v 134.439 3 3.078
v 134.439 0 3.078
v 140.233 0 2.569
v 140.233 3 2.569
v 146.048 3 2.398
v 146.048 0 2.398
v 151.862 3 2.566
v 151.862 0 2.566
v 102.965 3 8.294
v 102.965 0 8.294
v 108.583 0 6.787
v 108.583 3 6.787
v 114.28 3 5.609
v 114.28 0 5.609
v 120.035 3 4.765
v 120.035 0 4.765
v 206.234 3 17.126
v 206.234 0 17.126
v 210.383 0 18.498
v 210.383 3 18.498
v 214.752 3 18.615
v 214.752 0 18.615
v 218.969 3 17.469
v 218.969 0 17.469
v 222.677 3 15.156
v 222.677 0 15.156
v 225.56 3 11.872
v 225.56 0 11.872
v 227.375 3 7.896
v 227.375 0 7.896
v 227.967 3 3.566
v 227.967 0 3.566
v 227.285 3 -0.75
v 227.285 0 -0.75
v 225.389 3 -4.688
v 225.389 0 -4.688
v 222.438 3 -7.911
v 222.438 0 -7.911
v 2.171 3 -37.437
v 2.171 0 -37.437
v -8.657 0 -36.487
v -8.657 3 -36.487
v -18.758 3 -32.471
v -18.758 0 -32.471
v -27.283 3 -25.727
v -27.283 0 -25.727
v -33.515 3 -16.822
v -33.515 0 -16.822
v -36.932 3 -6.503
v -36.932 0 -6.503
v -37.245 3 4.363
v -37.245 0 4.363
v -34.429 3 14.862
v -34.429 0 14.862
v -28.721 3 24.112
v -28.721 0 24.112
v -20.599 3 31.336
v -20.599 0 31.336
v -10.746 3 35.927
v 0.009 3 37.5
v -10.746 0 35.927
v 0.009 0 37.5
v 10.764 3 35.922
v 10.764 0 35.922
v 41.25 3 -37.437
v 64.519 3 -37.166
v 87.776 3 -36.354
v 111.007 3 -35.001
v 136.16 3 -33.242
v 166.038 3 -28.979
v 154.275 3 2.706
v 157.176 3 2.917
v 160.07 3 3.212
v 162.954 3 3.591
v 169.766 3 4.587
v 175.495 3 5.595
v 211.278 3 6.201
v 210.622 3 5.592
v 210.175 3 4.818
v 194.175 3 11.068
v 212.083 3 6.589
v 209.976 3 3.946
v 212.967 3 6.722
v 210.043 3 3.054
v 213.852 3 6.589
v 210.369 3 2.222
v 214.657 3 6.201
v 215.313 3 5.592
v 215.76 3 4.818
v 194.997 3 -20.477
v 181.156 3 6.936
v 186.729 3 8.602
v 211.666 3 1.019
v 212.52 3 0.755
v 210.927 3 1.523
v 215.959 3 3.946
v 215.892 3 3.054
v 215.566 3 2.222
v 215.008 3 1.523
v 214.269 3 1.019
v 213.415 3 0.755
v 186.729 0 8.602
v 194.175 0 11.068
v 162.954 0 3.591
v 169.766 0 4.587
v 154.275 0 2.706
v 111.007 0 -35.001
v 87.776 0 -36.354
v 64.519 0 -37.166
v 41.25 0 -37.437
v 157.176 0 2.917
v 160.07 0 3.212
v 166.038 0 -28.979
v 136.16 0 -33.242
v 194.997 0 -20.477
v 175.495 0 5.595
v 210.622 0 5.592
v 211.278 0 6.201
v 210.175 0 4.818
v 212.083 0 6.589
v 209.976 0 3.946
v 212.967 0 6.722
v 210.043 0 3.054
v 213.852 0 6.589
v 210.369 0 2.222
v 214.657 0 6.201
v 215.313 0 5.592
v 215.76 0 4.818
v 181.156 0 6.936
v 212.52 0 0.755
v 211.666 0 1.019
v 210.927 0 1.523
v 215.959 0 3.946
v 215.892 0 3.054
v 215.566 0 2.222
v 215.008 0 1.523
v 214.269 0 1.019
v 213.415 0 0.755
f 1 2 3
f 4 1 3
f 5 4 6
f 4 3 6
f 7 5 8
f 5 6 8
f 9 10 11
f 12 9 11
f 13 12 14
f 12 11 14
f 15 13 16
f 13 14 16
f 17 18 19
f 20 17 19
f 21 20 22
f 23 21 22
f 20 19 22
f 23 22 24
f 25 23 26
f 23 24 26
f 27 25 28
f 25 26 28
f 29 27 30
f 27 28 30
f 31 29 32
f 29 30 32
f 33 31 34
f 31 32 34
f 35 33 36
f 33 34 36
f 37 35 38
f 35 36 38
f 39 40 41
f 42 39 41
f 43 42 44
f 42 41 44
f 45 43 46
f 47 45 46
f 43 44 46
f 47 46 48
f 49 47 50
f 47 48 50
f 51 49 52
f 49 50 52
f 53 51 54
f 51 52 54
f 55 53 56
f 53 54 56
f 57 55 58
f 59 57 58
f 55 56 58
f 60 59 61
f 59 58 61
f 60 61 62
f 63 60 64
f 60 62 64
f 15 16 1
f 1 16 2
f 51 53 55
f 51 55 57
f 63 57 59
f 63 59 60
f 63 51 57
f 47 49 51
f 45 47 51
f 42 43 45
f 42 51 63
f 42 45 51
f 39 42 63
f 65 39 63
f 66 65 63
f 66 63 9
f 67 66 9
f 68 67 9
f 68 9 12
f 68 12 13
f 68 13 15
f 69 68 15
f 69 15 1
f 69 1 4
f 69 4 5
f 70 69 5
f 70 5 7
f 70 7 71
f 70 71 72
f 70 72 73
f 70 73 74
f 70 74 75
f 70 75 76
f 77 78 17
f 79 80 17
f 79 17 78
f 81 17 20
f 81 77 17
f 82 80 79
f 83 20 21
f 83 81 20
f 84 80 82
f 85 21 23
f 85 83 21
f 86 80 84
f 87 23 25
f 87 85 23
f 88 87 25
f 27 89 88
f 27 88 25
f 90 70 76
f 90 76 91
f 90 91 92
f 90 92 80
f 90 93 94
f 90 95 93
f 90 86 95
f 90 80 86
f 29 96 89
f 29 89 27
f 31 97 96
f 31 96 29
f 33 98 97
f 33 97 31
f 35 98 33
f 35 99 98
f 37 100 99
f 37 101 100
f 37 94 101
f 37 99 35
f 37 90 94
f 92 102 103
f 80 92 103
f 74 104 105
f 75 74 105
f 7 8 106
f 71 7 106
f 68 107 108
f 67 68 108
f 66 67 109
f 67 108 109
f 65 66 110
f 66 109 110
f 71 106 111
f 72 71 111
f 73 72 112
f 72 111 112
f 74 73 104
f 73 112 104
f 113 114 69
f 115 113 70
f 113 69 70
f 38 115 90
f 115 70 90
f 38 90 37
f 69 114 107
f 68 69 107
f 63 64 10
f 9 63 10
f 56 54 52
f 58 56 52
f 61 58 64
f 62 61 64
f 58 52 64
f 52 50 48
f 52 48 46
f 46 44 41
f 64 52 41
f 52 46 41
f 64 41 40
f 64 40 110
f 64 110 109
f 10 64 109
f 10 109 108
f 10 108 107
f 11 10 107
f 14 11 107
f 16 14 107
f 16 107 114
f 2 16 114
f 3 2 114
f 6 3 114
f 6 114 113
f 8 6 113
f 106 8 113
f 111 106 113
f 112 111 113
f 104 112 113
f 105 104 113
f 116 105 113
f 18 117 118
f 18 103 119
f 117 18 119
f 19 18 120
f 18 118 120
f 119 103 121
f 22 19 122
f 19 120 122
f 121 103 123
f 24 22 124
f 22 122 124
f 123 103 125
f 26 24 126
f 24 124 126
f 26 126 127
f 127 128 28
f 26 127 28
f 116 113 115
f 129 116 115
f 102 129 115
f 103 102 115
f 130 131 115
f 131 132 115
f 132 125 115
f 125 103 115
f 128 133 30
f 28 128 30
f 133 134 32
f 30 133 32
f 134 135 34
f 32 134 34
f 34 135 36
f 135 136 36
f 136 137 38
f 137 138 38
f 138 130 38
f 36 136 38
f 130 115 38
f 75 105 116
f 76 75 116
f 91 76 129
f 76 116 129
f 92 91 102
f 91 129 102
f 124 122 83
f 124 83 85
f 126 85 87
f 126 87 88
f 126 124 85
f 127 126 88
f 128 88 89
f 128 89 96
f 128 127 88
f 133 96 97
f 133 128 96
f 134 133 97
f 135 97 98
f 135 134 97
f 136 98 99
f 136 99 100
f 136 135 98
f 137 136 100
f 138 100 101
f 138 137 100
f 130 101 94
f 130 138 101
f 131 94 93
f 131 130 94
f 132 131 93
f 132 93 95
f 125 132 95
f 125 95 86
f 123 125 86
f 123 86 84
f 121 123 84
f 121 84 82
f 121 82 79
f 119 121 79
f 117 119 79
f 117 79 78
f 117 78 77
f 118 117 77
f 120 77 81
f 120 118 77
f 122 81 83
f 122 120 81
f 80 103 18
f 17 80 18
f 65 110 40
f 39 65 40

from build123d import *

# Parameters (mm, degrees)
SKETCH_3_R          = 3
EXTRUDE_3_DEPTH     = 3
CUT_EXTRUDE_1_DEPTH = 232.050692133


with BuildPart() as part:
    # 草图3 → 凸台-拉伸3 (new body)
    with BuildSketch(Plane(origin=(0, 0, 0), x_dir=(1, 0, 0), z_dir=(0, 1, 0))):
        with BuildLine():
            Line((41.250352709, 37.437096955), (2.1711222, 37.437096955))
            ThreePointArc((2.1711222, 37.437096955), (-37.245354745, -4.362745688), (10.764053756, -35.921931278))
            Line((10.764053756, -35.921931278), (102.964763311, -8.293867902))
            ThreePointArc((102.964763311, -8.293867902), (111.422798179, -6.156653751), (120.034918159, -4.764738657))
            Line((120.034918159, -4.764738657), (134.438707225, -3.077546548))
            ThreePointArc((134.438707225, -3.077546548), (143.139368882, -2.441523824), (151.862354927, -2.566233988))
            Line((151.862354927, -2.566233988), (154.274717881, -2.706136256))
            ThreePointArc((154.274717881, -2.706136256), (158.623829365, -3.053695832), (162.953641123, -3.590630188))
            Line((162.953641123, -3.590630188), (169.76623366, -4.586797783))
            ThreePointArc((169.76623366, -4.586797783), (178.335042253, -6.22434395), (186.728522391, -8.602479637))
            Line((186.728522391, -8.602479637), (194.174928436, -11.067895146))
            Line((194.174928436, -11.067895146), (206.234258671, -17.125709257))
            ThreePointArc((206.234258671, -17.125709257), (225.560310545, -11.871725652), (222.437509756, 7.910810586))
            Line((222.437509756, 7.910810586), (215.500702076, 12.589746446))
            ThreePointArc((215.500702076, 12.589746446), (200.255076036, 21.040534955), (183.773601289, 26.715561818))
            Line((183.773601289, 26.715561818), (174.440874355, 29.042471985))
            ThreePointArc((174.440874355, 29.042471985), (165.892131299, 30.781733417), (157.22433217, 31.769304384))
            Line((157.22433217, 31.769304384), (111.006826453, 35.001147214))
            ThreePointArc((111.006826453, 35.001147214), (76.149849411, 36.827923974), (41.250352709, 37.437096955))
        make_face()
        with Locations(Location((212.967480872, -3.721839712, 0), (0, 0, 270))):
            Circle(SKETCH_3_R, mode=Mode.SUBTRACT)
    extrude(amount=EXTRUDE_3_DEPTH)

    # 草图4 → 切除-拉伸1 (cut, through all)
    with BuildSketch(Plane(origin=(0, 3, 0), x_dir=(1, 0, 0), z_dir=(0, 1, 0))):
        with BuildLine():
            ThreePointArc((136.159607467, 33.242293427), (180.670295505, 25.248626767), (222.437509756, 7.910810586))
            Line((222.437509756, 7.910810586), (215.500702076, 12.589746446))
            ThreePointArc((215.500702076, 12.589746446), (200.255076036, 21.040534955), (183.773601289, 26.715561818))
            Line((183.773601289, 26.715561818), (174.440874355, 29.042471985))
            ThreePointArc((174.440874355, 29.042471985), (165.892131299, 30.781733417), (157.22433217, 31.769304384))
            Line((157.22433217, 31.769304384), (136.159607467, 33.242293427))
        make_face()
    extrude(amount=-CUT_EXTRUDE_1_DEPTH, mode=Mode.SUBTRACT)


solid = part.part
